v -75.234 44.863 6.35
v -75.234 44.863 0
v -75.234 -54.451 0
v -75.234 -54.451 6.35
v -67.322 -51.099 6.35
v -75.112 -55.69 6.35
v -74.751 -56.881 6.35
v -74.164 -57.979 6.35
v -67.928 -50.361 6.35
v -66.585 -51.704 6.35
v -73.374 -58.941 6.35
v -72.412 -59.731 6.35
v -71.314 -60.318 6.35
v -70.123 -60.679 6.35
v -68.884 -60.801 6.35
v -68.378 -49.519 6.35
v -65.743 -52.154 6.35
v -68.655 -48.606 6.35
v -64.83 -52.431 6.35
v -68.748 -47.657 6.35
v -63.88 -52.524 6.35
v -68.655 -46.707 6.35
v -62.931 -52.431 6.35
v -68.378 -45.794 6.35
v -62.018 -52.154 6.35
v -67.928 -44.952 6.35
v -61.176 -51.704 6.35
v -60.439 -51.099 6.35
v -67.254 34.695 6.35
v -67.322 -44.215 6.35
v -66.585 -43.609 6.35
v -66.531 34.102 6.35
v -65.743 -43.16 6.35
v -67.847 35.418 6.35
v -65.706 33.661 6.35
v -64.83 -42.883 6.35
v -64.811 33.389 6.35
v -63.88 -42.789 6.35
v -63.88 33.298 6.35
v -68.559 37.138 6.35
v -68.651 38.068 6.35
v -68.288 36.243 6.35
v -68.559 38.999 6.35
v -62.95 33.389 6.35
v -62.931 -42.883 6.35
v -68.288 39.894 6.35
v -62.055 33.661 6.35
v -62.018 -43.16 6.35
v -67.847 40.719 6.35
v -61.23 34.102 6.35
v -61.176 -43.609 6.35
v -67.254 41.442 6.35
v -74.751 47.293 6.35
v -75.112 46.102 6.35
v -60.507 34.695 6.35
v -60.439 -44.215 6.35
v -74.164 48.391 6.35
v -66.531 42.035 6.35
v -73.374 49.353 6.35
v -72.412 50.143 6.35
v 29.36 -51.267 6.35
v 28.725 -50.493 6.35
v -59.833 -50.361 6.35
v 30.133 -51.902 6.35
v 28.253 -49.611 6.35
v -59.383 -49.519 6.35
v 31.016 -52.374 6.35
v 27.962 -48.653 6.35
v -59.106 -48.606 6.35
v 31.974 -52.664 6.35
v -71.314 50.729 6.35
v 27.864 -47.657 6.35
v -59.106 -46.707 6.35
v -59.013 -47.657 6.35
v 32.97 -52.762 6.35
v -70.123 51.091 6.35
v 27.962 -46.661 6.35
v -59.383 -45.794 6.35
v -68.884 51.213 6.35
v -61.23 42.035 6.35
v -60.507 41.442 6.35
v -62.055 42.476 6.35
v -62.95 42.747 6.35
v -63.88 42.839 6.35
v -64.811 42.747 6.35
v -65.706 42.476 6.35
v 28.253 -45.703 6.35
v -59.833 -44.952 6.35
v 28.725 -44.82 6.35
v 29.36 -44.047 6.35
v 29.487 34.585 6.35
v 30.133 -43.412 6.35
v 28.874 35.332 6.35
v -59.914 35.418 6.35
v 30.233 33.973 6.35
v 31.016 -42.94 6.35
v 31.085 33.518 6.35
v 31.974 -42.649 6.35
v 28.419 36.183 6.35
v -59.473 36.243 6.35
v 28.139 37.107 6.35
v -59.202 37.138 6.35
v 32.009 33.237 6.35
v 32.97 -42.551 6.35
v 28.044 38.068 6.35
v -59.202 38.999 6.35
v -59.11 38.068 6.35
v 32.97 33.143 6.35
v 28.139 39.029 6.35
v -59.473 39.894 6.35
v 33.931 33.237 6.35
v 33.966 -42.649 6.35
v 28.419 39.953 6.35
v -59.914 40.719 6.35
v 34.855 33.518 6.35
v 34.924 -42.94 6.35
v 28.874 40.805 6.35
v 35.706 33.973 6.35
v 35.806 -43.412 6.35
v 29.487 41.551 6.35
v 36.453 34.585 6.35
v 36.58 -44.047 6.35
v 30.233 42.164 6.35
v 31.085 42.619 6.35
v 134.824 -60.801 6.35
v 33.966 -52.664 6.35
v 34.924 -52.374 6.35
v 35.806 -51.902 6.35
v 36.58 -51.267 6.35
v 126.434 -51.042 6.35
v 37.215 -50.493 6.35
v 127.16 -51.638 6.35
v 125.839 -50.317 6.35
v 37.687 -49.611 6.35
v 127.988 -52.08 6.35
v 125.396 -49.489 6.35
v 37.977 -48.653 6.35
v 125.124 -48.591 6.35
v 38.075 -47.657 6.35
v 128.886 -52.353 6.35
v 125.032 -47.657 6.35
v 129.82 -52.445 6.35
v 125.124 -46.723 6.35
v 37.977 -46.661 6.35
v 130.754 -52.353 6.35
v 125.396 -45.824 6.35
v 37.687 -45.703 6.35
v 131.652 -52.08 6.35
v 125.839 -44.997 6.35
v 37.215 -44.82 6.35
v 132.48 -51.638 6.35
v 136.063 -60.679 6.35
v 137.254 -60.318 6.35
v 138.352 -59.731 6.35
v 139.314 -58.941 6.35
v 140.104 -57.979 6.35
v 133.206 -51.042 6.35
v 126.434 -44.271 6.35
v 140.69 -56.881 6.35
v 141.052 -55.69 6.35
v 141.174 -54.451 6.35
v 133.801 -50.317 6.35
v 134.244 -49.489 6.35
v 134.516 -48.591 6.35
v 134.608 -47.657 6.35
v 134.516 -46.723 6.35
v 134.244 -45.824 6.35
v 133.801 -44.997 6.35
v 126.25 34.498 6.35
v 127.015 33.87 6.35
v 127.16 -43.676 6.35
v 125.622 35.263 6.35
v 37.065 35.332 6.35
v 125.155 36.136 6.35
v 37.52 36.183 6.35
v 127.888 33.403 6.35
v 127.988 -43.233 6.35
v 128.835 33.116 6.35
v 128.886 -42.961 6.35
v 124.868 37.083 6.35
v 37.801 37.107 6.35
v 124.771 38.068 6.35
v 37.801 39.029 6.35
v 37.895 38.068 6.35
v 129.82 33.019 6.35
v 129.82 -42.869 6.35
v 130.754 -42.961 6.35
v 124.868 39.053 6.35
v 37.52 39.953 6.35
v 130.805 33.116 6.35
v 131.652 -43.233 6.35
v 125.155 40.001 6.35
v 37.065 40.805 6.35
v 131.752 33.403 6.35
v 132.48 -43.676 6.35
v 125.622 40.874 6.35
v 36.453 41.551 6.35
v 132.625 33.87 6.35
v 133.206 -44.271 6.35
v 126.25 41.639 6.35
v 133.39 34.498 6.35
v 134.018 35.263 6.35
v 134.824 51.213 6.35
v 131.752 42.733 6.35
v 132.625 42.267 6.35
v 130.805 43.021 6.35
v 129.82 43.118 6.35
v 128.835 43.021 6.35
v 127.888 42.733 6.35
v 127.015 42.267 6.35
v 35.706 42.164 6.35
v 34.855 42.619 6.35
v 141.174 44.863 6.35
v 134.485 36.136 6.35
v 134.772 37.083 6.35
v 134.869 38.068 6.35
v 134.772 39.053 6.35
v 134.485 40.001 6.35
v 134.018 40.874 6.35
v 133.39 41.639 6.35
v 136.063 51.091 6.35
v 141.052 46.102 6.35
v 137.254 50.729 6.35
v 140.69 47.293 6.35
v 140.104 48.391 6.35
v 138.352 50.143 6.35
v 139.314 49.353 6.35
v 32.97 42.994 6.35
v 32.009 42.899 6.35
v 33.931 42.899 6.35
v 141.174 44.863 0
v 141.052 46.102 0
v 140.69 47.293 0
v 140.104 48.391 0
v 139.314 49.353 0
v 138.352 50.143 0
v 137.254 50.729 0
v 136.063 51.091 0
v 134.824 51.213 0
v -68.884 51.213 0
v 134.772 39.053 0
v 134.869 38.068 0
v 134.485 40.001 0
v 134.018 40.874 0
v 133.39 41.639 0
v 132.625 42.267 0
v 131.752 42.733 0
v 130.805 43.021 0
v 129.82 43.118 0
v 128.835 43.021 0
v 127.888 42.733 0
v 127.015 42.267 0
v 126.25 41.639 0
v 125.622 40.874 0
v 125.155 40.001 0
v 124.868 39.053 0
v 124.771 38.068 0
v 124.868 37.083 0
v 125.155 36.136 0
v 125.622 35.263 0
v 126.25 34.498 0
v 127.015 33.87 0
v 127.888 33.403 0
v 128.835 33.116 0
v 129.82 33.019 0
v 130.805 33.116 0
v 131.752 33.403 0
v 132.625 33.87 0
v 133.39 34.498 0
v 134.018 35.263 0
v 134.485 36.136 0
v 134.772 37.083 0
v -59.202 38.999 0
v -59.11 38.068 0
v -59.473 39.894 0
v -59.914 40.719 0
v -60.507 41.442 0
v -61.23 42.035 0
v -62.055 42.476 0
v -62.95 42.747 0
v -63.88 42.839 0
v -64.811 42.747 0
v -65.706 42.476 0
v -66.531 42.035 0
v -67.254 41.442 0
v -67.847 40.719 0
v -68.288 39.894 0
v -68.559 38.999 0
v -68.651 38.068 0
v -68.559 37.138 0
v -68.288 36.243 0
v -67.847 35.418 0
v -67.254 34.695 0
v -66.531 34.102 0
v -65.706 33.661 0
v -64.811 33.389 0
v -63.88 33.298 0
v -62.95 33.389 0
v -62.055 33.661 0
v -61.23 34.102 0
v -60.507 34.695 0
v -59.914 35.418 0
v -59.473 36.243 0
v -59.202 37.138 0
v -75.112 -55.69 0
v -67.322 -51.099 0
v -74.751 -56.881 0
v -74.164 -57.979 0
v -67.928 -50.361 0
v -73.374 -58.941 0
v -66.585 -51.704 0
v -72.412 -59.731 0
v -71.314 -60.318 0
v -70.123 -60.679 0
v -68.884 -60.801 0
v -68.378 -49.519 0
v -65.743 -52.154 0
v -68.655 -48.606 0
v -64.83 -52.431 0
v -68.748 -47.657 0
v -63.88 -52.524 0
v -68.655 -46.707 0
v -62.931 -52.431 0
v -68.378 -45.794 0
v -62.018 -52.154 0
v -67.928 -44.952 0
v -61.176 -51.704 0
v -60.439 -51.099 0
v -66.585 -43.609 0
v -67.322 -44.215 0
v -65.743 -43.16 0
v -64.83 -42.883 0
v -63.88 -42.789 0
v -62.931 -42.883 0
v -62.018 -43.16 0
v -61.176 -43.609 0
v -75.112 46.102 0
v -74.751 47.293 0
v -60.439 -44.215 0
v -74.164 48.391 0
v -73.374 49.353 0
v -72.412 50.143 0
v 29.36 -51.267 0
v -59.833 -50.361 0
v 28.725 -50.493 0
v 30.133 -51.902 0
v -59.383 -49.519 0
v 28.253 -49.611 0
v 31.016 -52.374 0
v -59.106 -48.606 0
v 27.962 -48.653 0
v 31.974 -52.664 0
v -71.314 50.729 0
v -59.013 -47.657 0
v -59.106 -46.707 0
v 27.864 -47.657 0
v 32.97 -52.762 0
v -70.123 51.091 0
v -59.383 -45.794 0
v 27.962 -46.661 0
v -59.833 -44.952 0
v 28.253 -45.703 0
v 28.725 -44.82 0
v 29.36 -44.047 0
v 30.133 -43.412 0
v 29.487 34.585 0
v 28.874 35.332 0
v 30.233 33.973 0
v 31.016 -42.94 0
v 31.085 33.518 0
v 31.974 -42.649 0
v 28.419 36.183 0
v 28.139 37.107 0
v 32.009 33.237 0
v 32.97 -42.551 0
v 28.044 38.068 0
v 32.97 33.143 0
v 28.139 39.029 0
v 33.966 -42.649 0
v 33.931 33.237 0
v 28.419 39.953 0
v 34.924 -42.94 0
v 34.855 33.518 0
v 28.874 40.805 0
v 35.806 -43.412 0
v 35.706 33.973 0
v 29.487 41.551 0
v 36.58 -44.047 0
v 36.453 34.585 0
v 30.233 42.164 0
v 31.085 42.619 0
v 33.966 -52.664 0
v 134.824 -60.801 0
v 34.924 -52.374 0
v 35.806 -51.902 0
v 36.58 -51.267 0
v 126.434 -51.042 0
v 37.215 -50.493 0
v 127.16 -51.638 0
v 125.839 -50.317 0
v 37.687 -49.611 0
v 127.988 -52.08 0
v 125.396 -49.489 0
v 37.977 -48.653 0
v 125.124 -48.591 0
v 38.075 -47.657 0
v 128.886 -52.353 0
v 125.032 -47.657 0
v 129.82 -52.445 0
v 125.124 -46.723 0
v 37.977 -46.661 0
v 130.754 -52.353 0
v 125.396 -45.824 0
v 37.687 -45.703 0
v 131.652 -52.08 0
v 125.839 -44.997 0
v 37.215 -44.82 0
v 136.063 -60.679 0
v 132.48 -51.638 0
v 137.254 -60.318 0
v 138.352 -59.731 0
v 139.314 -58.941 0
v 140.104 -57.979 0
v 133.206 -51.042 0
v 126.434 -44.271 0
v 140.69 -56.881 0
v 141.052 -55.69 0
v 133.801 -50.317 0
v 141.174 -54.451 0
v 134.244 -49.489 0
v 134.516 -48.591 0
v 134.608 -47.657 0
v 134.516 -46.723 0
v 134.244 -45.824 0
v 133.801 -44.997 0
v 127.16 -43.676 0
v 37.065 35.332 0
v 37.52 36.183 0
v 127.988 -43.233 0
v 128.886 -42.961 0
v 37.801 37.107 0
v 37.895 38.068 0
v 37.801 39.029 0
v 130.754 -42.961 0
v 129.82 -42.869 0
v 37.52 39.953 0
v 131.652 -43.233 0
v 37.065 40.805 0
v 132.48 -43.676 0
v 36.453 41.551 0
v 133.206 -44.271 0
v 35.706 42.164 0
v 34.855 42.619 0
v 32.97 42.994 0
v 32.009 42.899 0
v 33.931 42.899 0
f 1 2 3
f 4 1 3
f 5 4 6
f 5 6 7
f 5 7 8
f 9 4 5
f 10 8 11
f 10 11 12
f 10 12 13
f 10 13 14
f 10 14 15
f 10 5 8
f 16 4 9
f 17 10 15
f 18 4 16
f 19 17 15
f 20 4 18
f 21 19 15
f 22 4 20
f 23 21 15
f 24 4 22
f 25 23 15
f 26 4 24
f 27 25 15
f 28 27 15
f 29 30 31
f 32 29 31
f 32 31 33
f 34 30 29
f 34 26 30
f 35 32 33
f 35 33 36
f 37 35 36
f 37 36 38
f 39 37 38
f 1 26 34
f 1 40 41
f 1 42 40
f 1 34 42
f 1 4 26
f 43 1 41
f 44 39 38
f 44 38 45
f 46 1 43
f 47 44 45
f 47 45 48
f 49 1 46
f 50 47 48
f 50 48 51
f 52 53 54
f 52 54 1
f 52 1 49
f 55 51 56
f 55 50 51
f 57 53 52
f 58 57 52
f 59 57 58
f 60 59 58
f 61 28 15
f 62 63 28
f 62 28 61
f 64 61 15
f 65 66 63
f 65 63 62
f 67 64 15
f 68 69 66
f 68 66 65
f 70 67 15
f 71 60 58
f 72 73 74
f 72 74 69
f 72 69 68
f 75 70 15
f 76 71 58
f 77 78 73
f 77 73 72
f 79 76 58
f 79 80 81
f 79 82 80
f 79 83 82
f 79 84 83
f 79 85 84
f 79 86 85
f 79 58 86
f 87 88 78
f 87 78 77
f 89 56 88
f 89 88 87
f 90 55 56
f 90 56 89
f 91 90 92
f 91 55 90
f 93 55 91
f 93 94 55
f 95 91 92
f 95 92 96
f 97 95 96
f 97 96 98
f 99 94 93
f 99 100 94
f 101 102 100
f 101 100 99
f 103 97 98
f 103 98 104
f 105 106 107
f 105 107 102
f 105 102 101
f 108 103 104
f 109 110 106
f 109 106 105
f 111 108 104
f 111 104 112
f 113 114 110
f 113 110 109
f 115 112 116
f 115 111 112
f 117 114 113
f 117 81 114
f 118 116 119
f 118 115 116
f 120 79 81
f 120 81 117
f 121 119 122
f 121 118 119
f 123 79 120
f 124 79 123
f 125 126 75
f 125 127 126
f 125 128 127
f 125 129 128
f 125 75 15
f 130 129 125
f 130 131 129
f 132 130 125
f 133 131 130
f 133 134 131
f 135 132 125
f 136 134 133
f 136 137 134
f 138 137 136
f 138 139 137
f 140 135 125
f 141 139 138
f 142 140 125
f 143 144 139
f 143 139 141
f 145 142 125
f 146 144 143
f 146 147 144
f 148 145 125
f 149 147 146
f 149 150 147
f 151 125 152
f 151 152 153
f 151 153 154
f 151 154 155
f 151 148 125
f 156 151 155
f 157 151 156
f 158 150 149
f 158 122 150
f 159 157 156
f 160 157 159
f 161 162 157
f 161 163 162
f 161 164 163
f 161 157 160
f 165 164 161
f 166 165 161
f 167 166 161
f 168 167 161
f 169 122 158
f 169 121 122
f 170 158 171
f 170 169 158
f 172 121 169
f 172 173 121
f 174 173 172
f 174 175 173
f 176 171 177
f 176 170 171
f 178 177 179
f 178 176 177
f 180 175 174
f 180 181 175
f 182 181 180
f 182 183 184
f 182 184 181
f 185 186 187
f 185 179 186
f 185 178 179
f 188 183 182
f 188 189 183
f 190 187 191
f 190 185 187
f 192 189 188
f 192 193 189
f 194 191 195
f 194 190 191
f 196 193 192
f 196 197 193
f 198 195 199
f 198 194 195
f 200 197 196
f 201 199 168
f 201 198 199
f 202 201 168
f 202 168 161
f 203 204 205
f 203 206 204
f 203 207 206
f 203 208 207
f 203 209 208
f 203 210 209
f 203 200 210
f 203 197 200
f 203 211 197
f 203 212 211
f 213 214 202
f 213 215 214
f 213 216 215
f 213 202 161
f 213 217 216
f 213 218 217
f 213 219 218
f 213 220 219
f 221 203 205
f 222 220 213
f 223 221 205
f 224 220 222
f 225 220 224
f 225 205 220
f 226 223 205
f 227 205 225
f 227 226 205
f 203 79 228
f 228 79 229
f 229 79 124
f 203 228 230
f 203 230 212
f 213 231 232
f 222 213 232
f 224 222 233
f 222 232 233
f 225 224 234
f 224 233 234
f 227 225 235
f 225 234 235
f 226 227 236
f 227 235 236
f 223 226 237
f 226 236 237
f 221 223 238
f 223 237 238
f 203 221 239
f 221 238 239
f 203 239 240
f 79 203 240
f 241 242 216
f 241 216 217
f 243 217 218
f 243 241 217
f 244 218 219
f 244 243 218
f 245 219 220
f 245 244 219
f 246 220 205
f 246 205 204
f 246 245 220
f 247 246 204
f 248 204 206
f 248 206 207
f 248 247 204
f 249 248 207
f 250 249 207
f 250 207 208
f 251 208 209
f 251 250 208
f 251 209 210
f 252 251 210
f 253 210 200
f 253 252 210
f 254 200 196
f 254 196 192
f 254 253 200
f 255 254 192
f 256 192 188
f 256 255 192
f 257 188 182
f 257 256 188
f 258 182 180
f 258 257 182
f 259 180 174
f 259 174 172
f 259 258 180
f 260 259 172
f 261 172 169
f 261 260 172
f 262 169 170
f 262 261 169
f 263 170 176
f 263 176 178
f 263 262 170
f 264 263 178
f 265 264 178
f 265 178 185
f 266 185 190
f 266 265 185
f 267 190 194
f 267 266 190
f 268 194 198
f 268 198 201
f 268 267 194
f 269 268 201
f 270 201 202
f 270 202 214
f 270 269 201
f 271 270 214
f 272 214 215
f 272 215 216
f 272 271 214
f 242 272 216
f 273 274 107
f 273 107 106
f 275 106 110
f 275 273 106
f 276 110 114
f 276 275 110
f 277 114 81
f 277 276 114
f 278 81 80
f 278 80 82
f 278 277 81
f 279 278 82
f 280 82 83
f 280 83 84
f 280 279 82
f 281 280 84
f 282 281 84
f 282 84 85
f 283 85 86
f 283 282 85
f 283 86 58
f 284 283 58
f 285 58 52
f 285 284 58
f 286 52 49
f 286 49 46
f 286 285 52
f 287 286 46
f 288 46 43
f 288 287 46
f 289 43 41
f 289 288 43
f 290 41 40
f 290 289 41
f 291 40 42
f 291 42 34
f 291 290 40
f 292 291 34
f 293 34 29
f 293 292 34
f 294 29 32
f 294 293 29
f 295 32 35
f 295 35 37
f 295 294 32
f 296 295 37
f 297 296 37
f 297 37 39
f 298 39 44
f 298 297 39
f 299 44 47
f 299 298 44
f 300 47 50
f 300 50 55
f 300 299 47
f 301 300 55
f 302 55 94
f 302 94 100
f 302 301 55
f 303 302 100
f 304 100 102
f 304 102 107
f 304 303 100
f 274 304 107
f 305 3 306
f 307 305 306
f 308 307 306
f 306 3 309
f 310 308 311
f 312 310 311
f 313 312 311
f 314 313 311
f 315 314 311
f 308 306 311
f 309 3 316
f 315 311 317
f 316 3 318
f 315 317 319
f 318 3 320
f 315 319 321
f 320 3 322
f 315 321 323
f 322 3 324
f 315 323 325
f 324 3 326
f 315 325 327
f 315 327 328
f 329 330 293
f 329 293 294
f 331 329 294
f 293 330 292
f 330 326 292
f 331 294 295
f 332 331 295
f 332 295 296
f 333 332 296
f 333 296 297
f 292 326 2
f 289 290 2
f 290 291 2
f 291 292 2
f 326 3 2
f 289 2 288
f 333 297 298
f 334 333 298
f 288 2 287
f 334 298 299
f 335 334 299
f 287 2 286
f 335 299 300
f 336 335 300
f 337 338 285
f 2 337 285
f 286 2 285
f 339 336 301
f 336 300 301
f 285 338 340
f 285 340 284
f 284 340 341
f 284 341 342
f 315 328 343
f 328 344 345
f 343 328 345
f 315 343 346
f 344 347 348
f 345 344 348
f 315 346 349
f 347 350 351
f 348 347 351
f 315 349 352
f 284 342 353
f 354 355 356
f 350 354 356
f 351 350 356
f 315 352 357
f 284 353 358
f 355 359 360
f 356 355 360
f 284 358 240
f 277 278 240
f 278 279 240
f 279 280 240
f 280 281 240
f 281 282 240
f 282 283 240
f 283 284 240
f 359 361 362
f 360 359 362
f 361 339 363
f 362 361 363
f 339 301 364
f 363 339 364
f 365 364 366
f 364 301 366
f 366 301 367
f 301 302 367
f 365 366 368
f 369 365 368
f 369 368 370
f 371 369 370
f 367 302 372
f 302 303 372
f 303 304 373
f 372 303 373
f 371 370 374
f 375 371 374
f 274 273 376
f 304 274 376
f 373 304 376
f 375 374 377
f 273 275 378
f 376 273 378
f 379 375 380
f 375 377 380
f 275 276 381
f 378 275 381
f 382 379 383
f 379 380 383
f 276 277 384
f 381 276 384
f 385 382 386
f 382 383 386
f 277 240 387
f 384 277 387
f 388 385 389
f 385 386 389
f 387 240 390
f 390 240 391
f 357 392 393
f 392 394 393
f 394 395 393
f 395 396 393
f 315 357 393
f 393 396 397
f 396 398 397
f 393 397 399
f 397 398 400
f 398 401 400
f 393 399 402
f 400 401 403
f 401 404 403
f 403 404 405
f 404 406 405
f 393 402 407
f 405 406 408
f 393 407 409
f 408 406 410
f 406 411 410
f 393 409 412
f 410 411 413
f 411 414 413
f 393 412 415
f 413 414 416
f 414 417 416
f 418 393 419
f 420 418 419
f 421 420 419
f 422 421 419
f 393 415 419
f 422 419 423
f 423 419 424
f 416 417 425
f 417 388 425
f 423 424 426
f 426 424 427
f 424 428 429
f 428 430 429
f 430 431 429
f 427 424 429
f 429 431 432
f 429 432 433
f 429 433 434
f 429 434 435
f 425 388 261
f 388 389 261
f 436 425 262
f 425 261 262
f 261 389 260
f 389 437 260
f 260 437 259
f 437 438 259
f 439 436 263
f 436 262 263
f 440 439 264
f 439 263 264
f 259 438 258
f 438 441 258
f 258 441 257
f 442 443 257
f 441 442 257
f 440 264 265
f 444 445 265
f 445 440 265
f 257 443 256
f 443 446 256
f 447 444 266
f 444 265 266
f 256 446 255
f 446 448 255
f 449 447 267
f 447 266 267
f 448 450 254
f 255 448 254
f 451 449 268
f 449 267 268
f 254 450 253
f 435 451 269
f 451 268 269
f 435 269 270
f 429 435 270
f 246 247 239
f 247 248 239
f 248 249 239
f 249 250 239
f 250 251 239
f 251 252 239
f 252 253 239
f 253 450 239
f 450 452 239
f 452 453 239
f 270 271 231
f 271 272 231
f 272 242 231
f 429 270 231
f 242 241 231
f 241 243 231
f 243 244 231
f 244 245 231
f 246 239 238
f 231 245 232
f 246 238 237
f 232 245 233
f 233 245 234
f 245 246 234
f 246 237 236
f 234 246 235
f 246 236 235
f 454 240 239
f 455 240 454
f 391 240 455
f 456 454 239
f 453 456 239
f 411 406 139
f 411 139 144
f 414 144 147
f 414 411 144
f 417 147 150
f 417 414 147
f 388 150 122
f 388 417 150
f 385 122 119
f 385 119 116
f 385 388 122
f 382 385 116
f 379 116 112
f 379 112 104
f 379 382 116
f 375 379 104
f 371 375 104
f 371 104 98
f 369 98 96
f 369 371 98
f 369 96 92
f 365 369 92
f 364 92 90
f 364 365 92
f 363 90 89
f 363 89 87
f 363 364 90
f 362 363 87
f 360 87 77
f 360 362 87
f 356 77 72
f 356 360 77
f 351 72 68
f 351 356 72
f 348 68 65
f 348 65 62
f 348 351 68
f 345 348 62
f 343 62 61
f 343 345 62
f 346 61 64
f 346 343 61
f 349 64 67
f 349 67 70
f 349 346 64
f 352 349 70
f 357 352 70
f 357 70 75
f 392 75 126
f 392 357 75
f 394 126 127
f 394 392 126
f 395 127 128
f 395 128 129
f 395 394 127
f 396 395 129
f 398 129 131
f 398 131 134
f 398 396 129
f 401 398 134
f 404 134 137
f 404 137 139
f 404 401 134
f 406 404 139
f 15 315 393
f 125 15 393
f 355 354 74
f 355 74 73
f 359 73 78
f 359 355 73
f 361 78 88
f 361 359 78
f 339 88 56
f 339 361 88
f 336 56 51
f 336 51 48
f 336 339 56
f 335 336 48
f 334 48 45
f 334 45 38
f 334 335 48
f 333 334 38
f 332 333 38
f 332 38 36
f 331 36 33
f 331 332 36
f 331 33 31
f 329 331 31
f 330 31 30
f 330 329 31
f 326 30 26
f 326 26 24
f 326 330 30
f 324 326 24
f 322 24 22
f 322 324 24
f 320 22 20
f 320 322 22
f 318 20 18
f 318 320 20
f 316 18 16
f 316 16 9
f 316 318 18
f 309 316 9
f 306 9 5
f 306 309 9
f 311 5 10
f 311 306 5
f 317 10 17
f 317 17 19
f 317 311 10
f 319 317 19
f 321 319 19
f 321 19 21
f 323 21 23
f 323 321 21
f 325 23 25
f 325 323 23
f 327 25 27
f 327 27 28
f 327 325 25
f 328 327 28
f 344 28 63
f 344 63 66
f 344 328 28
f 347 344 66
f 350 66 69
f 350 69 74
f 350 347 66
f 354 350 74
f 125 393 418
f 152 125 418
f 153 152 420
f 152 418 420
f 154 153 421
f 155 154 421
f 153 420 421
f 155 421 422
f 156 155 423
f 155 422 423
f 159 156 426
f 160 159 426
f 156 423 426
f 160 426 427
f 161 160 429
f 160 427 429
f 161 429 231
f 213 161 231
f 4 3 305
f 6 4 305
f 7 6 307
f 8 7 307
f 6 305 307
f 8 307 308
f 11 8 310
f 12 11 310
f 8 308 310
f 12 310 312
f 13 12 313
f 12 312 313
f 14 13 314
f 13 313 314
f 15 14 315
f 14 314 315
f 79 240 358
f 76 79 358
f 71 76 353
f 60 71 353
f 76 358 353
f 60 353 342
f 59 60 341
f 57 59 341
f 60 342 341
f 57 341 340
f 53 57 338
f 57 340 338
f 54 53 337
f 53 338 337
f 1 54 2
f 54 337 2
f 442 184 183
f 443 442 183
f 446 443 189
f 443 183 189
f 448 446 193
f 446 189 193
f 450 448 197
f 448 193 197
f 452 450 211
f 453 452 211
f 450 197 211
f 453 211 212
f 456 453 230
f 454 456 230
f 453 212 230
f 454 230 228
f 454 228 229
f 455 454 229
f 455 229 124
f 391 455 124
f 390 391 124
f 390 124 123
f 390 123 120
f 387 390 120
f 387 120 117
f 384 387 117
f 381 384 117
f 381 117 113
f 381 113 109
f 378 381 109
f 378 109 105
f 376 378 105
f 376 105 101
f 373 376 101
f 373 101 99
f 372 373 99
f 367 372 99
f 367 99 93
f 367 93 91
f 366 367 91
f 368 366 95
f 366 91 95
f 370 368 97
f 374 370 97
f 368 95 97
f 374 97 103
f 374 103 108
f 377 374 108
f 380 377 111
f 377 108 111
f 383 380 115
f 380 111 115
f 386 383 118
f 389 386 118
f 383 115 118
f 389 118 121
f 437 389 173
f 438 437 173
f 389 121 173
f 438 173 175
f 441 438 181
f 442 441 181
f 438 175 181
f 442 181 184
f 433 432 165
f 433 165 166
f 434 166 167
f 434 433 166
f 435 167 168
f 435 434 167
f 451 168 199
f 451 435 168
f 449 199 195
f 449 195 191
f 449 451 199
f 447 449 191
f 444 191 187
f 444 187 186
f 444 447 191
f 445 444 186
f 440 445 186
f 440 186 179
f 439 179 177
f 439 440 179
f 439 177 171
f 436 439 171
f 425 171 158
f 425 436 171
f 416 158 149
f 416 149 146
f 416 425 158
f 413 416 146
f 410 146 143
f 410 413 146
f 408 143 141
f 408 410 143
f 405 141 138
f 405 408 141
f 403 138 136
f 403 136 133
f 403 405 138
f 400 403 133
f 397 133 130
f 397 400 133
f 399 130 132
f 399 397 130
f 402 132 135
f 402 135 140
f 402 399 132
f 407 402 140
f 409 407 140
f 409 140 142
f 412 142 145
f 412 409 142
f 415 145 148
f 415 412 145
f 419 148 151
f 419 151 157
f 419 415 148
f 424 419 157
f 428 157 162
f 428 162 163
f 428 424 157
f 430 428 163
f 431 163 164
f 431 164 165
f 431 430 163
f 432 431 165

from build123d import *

# Parameters (mm, degrees)
F0_R     = 4.867648
F0_R_2   = 5.105565
F0_R_3   = 4.788046
F0_R_4   = 4.770591
F0_R_5   = 5.049327
F1_DEPTH = 6.35
F2_R     = 4.925574
F3_DEPTH = 25.4


with BuildPart() as f1:
    # F0 (on Top) → F1 (new body)
    with BuildSketch(Plane.XY):
        with BuildLine():
            Line((134.823743, 51.212785), (-68.884257, 51.212785))
            ThreePointArc((-68.884257, 51.212785), (-73.374385, 49.352913), (-75.234257, 44.862785))
            Line((-75.234257, 44.862785), (-75.234257, -54.451215))
            ThreePointArc((-75.234257, -54.451215), (-73.374385, -58.941343), (-68.884257, -60.801215))
            Line((-68.884257, -60.801215), (134.823743, -60.801215))
            ThreePointArc((134.823743, -60.801215), (139.313871, -58.941343), (141.173743, -54.451215))
            Line((141.173743, -54.451215), (141.173743, 44.862785))
            ThreePointArc((141.173743, 44.862785), (139.313871, 49.352913), (134.823743, 51.212785))
        make_face()
        with Locations((-63.880457, -47.656715)):
            Circle(F0_R, mode=Mode.SUBTRACT)
        with Locations((32.969743, -47.656715)):
            Circle(F0_R_2, mode=Mode.SUBTRACT)
        with Locations((129.819943, -47.656715)):
            Circle(F0_R_3, mode=Mode.SUBTRACT)
        with Locations((-63.880457, 38.068285)):
            Circle(F0_R_4, mode=Mode.SUBTRACT)
        with Locations((129.819943, 38.068285)):
            Circle(F0_R_5, mode=Mode.SUBTRACT)
    extrude(amount=F1_DEPTH)

    # F2 (on face) → F3 (cut)
    with BuildSketch(Plane.XY.offset(6.35)):
        with Locations((32.969743, 38.068285)):
            Circle(F2_R)
    extrude(amount=-F3_DEPTH, mode=Mode.SUBTRACT)


solid = f1.part
